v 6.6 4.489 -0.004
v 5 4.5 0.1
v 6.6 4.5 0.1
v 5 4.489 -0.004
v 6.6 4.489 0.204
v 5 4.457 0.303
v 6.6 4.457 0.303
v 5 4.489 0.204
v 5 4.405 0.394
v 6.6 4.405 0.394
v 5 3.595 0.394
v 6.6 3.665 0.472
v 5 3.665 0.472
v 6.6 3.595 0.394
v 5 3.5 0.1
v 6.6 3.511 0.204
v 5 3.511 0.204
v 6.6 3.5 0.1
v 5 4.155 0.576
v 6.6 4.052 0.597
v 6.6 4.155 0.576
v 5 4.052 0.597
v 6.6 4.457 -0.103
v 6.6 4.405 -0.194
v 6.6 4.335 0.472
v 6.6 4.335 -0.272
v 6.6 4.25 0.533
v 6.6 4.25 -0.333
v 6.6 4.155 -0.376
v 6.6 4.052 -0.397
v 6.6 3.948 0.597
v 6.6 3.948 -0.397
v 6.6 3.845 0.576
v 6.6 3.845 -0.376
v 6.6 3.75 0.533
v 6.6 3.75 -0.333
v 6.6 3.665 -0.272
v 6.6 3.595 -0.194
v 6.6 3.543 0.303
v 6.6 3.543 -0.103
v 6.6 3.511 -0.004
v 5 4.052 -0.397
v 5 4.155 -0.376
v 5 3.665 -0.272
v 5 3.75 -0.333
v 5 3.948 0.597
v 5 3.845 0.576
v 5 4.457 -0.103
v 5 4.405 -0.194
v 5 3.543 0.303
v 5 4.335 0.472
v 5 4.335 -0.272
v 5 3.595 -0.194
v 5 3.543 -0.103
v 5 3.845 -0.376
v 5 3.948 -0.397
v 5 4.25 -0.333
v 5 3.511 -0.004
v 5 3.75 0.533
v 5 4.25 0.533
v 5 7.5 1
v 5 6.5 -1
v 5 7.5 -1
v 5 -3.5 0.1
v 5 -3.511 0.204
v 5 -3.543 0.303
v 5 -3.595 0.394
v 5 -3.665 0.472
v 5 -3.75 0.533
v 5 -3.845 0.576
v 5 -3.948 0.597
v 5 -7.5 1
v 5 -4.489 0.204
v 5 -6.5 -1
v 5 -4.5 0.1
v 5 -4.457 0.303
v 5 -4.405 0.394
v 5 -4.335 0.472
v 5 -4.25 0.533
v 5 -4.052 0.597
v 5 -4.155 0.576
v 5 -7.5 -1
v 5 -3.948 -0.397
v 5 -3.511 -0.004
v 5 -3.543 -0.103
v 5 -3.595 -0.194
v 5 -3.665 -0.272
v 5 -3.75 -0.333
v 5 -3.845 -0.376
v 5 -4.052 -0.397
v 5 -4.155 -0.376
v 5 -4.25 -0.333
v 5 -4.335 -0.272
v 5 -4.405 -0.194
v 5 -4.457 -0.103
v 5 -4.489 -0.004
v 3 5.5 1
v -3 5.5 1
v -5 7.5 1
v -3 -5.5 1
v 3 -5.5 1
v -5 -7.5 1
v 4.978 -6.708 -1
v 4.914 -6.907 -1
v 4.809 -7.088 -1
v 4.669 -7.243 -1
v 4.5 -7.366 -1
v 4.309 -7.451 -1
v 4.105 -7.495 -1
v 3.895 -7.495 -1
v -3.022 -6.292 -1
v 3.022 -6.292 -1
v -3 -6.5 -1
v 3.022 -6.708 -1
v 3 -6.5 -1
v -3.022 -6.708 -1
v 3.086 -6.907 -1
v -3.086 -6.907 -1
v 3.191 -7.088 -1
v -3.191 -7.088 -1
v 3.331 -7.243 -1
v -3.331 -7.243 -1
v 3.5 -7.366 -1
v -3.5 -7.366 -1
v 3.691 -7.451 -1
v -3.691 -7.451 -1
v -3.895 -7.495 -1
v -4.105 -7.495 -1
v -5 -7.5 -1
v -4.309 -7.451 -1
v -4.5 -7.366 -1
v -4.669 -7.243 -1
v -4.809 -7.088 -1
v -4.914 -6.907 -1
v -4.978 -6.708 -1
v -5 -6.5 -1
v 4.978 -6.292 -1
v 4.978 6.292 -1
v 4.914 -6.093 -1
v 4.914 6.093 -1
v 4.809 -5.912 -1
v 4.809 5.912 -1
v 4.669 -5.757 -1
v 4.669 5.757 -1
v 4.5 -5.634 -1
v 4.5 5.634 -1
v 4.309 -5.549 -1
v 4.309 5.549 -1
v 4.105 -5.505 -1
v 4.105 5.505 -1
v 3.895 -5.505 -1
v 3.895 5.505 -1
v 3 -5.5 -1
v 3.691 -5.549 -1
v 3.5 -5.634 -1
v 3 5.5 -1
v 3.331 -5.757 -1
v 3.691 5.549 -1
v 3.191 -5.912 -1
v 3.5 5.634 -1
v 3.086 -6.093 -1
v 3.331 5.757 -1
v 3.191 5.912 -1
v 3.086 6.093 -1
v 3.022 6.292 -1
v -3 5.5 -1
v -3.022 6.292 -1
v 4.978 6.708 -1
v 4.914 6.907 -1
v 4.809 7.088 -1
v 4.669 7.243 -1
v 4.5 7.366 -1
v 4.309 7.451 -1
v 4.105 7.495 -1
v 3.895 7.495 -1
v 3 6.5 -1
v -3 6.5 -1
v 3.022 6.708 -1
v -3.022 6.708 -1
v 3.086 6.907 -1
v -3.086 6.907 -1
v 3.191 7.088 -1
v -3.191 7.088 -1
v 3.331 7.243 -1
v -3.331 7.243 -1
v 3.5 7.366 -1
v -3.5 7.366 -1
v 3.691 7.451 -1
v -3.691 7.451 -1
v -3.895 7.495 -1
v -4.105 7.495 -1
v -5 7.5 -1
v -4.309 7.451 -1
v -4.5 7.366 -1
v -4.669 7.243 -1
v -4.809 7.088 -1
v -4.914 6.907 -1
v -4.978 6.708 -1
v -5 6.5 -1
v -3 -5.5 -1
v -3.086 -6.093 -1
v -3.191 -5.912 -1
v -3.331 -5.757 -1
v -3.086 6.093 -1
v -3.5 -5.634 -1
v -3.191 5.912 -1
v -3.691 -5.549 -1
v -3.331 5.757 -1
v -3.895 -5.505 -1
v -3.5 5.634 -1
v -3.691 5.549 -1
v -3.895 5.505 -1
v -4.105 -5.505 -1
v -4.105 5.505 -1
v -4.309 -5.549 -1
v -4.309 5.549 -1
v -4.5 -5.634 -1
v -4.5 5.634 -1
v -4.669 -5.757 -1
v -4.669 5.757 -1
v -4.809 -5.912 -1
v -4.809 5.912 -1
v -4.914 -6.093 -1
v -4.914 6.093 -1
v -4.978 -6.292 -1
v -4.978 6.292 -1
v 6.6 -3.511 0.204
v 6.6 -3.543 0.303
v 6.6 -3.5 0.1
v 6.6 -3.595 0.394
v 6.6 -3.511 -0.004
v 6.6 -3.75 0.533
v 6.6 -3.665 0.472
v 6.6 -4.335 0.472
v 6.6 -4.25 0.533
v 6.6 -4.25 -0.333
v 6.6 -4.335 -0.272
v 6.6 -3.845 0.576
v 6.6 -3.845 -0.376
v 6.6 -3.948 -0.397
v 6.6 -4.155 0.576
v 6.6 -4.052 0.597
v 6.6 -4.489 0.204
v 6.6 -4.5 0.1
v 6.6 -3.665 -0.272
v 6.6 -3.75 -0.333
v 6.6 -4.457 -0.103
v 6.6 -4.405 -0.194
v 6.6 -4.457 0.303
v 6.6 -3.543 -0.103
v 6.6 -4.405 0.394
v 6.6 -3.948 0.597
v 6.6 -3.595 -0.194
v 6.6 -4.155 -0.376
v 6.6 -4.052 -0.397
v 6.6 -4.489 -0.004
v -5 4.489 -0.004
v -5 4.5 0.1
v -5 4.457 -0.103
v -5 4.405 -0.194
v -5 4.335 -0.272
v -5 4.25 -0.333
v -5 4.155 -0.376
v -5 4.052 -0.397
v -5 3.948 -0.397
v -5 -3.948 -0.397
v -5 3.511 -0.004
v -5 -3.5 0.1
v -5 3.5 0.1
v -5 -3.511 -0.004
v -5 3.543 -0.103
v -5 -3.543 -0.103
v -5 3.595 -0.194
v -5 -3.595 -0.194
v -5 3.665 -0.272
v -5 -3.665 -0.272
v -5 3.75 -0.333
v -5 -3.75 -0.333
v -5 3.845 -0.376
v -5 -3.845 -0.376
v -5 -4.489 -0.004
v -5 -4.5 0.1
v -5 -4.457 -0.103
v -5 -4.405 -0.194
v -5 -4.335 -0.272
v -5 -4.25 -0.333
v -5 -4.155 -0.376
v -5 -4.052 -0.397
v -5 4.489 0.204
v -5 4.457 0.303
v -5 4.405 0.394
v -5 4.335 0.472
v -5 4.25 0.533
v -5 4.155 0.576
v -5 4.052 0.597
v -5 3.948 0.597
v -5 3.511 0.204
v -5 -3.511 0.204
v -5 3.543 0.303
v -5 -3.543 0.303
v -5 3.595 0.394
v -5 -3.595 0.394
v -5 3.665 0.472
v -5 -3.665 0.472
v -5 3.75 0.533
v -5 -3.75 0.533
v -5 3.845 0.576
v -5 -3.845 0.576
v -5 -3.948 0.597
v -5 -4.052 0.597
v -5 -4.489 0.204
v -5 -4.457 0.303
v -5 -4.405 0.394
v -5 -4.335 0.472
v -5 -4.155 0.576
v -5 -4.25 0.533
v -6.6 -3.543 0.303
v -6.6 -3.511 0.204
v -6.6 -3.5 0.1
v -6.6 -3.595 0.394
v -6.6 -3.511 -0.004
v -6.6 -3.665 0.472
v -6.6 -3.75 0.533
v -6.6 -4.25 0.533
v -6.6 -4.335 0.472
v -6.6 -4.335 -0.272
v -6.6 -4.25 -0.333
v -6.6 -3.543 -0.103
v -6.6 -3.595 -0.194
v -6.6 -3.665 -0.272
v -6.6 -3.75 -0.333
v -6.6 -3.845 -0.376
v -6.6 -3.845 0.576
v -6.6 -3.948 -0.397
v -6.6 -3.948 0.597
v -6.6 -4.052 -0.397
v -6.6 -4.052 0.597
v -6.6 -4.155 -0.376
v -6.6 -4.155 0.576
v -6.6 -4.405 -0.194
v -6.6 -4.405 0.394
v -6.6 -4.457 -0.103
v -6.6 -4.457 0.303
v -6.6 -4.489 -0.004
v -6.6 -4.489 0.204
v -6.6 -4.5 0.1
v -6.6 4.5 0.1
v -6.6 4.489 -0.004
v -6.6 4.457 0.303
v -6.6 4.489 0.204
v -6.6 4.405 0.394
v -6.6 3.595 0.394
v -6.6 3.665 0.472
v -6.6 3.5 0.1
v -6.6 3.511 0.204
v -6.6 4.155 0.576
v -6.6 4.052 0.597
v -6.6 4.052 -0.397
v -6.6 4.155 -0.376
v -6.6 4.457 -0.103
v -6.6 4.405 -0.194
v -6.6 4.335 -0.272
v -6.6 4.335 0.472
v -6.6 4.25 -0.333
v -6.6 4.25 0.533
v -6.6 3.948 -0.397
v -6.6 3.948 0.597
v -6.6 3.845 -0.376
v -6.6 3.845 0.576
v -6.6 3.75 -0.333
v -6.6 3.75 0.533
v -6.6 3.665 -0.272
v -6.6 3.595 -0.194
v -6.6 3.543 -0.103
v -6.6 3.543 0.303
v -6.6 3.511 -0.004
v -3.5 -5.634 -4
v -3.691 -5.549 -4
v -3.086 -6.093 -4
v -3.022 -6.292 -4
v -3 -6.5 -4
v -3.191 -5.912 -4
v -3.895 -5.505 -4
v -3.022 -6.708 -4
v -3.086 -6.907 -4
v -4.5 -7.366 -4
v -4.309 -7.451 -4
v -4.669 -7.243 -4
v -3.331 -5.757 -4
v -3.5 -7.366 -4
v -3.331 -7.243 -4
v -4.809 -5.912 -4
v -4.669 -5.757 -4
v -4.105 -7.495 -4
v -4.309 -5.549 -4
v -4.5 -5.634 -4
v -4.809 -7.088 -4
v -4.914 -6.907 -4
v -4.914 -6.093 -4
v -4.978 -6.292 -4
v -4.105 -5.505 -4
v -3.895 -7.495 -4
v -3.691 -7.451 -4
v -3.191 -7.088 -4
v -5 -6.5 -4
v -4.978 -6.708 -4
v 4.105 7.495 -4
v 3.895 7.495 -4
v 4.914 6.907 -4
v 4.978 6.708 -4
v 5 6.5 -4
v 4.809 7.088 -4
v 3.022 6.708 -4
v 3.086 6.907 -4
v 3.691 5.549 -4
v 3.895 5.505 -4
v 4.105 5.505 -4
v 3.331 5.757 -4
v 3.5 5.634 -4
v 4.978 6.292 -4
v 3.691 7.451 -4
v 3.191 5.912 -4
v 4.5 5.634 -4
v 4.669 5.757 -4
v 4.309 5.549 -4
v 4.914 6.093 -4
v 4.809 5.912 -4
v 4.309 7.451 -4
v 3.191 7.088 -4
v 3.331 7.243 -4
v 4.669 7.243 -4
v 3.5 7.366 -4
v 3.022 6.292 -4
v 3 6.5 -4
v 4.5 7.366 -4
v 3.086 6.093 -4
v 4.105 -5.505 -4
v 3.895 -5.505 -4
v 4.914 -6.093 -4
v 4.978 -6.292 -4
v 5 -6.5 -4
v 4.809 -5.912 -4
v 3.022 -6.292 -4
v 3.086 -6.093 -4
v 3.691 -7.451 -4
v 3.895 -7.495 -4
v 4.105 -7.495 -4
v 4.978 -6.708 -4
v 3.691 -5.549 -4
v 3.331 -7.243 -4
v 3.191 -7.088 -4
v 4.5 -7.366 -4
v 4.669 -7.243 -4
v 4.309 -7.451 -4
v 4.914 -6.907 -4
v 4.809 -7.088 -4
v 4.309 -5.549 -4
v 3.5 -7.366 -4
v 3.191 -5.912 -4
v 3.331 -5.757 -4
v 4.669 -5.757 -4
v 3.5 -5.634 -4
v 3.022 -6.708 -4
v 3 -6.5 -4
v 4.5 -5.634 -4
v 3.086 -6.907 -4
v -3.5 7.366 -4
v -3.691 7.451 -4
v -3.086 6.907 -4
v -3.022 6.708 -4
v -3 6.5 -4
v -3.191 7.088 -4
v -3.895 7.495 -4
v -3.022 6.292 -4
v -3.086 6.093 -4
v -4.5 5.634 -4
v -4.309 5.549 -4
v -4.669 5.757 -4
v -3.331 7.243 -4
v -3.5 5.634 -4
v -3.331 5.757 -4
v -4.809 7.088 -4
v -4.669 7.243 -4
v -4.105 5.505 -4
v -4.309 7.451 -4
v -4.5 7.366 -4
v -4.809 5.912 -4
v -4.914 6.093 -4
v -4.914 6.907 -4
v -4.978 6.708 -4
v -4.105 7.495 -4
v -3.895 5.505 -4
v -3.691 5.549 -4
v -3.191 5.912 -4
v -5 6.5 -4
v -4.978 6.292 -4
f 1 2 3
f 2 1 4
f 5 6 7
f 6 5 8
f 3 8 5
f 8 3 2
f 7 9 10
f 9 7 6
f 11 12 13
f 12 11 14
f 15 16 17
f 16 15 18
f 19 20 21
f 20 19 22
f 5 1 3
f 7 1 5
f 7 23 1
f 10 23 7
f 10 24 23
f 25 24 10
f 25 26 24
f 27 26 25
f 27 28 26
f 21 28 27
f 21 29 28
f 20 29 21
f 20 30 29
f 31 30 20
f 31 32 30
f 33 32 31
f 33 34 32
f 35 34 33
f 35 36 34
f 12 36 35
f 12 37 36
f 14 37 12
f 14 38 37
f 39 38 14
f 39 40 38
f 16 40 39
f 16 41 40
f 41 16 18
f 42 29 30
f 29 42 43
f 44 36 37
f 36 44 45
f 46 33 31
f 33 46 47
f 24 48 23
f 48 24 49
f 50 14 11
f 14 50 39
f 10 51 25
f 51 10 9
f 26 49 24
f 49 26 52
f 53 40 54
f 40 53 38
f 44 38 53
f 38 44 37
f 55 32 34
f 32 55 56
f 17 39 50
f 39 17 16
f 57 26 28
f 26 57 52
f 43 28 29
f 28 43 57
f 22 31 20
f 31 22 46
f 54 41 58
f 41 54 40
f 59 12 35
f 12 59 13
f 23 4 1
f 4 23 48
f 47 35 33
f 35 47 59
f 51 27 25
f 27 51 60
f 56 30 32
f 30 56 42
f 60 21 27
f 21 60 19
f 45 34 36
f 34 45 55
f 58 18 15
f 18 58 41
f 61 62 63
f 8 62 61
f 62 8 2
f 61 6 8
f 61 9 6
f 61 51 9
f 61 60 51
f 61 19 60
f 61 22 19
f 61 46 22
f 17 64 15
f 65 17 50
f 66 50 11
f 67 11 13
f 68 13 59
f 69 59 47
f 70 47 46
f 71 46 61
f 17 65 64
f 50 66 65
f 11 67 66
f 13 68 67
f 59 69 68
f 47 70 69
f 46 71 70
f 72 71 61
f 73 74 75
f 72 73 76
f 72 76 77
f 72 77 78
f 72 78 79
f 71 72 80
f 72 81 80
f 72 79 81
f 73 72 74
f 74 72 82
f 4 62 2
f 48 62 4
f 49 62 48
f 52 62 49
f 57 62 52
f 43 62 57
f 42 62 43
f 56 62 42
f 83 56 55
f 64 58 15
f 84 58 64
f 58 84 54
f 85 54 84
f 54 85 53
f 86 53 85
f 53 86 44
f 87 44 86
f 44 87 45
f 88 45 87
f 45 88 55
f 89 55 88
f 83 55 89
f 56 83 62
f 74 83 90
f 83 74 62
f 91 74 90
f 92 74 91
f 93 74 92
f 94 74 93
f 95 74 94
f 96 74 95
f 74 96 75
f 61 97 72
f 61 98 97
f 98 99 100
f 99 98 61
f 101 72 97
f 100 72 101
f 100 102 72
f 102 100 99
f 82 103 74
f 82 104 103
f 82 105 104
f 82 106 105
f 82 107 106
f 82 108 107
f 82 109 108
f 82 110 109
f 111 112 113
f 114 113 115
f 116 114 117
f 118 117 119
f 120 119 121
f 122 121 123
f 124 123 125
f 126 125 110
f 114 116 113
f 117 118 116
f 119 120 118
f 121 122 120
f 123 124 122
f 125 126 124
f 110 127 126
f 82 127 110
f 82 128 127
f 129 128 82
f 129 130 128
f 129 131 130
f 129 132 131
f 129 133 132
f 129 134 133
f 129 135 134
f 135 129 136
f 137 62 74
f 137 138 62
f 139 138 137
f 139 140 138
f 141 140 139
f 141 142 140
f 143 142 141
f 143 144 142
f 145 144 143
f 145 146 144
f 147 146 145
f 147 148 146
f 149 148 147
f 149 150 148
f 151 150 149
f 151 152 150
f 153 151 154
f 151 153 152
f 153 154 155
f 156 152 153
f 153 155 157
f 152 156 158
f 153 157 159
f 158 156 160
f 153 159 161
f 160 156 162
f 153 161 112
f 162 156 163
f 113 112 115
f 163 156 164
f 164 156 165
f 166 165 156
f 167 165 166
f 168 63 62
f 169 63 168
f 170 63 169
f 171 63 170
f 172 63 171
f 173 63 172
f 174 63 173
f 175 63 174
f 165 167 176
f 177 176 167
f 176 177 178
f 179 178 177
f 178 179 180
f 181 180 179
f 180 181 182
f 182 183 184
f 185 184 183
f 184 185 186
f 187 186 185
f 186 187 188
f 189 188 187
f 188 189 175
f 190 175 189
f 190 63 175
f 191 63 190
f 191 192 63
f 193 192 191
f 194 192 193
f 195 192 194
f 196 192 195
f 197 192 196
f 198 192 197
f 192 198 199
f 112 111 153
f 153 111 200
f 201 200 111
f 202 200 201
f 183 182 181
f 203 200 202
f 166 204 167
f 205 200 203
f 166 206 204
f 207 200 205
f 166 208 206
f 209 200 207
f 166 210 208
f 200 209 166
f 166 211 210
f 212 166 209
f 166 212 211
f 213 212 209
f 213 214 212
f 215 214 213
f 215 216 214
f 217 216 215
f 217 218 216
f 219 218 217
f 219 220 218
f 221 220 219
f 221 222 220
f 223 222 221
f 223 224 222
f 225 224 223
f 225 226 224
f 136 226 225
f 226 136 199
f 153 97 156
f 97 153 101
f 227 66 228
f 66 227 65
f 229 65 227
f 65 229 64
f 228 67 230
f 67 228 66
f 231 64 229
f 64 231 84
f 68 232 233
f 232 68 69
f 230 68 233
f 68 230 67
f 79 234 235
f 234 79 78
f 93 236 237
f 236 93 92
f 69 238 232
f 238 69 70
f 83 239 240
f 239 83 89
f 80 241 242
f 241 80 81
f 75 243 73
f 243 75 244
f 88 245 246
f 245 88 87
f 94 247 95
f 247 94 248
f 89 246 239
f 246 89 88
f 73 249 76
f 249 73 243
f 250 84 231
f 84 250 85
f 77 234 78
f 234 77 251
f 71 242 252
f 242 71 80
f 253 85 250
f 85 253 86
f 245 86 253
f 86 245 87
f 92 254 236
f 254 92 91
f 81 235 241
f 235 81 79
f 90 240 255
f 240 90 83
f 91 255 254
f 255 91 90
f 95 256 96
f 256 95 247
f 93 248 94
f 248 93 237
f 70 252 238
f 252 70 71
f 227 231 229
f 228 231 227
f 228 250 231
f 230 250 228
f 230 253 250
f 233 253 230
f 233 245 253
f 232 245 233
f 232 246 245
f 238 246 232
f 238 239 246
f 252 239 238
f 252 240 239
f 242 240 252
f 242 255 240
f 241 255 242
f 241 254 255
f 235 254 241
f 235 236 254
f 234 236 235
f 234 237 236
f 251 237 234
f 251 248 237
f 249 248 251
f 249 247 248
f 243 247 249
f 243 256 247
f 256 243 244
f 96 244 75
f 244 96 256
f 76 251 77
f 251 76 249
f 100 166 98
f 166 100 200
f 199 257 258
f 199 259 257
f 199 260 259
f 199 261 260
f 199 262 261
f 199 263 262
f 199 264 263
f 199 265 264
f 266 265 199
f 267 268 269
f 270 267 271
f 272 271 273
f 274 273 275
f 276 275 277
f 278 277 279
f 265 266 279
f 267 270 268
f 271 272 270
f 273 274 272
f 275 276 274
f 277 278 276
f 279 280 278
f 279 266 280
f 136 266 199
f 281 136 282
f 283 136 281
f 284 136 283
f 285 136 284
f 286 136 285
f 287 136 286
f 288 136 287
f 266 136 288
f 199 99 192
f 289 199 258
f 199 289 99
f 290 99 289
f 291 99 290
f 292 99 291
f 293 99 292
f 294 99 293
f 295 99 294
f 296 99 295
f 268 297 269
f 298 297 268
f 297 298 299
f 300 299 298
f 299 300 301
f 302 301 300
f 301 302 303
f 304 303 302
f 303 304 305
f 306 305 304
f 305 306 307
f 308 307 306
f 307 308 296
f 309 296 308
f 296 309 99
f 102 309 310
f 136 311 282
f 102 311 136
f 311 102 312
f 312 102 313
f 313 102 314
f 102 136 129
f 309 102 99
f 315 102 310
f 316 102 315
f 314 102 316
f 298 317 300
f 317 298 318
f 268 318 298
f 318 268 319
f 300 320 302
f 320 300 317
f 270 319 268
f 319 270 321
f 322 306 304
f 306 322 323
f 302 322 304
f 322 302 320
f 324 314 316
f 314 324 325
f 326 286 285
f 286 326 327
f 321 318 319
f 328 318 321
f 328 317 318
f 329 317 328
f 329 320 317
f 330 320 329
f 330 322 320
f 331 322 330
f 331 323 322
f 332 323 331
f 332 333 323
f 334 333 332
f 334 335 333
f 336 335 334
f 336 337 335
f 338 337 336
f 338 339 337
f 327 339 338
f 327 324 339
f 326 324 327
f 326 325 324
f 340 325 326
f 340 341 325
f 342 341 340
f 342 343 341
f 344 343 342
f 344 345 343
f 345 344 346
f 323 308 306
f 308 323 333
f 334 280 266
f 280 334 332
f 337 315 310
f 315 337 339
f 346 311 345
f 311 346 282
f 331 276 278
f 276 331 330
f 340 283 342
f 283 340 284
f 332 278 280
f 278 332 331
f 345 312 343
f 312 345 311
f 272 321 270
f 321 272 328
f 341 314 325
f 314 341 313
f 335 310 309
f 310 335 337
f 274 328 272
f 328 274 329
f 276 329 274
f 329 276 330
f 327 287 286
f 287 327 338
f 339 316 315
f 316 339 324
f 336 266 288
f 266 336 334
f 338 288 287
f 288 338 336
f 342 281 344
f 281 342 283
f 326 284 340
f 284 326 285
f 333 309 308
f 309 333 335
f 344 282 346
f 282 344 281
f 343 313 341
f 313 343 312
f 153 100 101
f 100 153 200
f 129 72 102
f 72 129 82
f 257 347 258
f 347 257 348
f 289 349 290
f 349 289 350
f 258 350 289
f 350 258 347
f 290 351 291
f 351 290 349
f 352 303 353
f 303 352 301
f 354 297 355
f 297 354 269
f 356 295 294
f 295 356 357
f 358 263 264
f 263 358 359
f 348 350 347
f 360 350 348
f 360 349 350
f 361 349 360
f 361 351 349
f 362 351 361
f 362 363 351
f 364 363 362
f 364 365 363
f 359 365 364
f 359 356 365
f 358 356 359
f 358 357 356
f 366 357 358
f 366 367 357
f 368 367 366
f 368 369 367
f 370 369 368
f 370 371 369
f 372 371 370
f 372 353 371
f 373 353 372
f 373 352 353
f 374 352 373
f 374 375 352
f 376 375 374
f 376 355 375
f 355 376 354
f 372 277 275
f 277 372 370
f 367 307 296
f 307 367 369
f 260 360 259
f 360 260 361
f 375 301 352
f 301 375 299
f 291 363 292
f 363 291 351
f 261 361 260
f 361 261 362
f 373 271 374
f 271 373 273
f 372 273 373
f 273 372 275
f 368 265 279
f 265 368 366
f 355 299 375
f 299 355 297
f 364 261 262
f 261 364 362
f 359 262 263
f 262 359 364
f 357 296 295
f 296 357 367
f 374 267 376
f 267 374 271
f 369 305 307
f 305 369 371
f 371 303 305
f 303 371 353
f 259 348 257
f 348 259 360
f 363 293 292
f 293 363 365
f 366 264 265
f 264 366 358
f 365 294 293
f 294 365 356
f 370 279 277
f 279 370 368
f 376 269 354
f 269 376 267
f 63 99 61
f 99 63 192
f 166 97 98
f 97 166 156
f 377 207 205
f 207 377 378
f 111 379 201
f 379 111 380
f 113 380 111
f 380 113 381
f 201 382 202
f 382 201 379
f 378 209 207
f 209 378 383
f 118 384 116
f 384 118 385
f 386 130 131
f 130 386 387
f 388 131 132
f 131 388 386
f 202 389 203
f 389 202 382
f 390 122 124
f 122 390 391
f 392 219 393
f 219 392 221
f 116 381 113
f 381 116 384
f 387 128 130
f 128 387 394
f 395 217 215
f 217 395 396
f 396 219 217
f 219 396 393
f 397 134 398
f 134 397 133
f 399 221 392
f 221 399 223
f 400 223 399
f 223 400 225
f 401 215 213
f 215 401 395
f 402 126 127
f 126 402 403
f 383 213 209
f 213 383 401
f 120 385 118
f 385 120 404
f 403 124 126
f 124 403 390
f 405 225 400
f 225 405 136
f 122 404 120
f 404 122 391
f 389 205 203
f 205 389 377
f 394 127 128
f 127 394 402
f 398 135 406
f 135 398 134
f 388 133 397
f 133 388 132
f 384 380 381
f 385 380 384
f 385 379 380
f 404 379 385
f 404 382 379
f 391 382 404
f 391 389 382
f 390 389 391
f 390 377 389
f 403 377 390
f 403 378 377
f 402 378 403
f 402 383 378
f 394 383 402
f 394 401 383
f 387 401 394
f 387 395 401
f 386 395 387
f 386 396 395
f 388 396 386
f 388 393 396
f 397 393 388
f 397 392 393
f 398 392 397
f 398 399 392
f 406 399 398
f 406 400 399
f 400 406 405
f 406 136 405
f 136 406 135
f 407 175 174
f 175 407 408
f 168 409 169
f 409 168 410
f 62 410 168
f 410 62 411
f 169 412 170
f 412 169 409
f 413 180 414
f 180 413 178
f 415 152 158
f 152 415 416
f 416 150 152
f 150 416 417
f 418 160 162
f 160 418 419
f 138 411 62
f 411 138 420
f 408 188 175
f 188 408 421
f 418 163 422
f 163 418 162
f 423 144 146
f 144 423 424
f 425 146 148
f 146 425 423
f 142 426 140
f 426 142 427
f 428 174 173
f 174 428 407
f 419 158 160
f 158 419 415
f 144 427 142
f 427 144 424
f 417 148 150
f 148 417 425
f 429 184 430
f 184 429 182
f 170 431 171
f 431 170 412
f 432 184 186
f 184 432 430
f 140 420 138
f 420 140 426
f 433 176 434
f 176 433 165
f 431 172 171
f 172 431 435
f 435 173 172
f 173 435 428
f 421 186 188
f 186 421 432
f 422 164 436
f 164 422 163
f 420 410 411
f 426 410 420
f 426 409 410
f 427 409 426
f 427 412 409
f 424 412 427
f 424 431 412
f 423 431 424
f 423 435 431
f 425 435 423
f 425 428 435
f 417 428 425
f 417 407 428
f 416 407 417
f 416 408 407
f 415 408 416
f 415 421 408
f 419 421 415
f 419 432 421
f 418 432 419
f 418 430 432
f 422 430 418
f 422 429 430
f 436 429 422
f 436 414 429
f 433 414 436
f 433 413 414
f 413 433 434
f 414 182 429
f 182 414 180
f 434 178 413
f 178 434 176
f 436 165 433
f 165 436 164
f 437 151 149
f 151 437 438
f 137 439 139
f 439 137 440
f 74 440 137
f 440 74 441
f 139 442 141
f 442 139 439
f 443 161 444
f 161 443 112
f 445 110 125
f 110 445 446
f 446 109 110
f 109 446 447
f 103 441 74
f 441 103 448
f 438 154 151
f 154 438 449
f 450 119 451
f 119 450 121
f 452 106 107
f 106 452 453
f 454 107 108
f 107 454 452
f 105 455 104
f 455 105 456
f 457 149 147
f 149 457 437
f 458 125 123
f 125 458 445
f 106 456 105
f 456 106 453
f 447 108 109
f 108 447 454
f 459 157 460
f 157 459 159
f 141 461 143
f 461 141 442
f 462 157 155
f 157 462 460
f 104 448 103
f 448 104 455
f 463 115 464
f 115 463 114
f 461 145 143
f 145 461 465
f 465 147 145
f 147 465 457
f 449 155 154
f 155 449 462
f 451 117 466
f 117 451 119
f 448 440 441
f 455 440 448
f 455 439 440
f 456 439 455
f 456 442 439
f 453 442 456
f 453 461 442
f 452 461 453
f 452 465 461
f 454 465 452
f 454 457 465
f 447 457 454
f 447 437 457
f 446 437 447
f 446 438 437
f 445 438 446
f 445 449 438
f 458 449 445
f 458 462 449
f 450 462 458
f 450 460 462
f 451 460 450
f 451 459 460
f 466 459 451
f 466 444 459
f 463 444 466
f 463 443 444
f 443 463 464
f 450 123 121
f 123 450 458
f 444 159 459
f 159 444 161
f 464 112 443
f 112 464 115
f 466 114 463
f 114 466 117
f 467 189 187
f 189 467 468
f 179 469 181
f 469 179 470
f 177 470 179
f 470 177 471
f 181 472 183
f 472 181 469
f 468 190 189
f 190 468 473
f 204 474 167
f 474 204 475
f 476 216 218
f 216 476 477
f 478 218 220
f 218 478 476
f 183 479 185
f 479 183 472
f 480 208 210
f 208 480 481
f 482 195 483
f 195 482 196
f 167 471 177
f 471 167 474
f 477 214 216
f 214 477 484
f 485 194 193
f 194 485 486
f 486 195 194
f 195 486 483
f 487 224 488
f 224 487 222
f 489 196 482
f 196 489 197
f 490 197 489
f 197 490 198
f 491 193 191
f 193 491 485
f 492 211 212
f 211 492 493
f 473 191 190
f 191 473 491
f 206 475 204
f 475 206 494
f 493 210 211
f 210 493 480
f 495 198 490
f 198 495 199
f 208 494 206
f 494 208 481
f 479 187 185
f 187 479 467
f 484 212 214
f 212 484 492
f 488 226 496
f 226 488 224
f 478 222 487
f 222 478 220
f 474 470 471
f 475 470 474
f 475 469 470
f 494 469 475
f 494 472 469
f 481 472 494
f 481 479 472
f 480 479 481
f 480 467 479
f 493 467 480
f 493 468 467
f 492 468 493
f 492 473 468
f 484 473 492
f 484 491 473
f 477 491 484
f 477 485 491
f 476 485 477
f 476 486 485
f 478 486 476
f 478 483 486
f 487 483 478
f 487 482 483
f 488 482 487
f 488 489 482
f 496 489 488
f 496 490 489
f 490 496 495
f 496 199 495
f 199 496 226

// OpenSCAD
// le cadre du milieu avec avec les connecteurs sur les côté (2 sur chaque)
// Middle piece with connectors on the side (2 each)
// côté droite(longeur)avec un connecteur (extrême droite)   
//righ side legth with connector (far right)
union () 					{
rotate(a=120,v=[1,1,1])translate([4,0.1,4])cylinder(r=0.5,h=2.6);
translate([4,0,0]) {
cube(size=[2,13,2],center=true);
		}
// côté gauche (longeur)avec la deuxième connecteur (droite)
//left side legth with seconde connector (right) 
rotate(a=120,v=[1,1,1])translate([-4,0.1,4])cylinder(r=0.5,h=2.6);
translate([-4,0,0]){								
cube(size=[2,13,2], center=true);
		}		
// largeur(vers l'avant)avec la trosième connecteur (gauche)
// Width (front) with third connecteur (left)
rotate(a=120,v=[1,1,1])translate([-4,0.1,-6.6])cylinder(r=0.5,h=2.6);
translate([0,-6.5,0]){
cube(size=[10,2,2],center=true);
		}
// largeur (vers l'arrière) avec quatrième connecteur (extreme gauche) 
// Width (back) with fourth connector (far left)
rotate(a=120,v=[1,1,1])translate([4,0.1,-6.6])cylinder(r=0.5,h=2.6);
translate([0,6.5,0]){
cube(size=[10,2,2],center=true);
		}

								}

// Jambe gauche
// left leg
$fn=30;
translate([-4,-6.5,-4]){
cylinder(h=3,l=10);
		}

// Jambe extrême droite
// far right leg
$fn=30;
translate([4,6.5,-4]){
cylinder(h=3,l=10);
		}

// Jambe droite
//right leg
$fn=30;
translate([4,-6.5,-4]){
cylinder(h=3,l=10);
		}

//Jambe extrême gauche
//far left leg
$fn=30;
translate([-4,6.5,-4]){
cylinder(h=3,l=10);
		}
